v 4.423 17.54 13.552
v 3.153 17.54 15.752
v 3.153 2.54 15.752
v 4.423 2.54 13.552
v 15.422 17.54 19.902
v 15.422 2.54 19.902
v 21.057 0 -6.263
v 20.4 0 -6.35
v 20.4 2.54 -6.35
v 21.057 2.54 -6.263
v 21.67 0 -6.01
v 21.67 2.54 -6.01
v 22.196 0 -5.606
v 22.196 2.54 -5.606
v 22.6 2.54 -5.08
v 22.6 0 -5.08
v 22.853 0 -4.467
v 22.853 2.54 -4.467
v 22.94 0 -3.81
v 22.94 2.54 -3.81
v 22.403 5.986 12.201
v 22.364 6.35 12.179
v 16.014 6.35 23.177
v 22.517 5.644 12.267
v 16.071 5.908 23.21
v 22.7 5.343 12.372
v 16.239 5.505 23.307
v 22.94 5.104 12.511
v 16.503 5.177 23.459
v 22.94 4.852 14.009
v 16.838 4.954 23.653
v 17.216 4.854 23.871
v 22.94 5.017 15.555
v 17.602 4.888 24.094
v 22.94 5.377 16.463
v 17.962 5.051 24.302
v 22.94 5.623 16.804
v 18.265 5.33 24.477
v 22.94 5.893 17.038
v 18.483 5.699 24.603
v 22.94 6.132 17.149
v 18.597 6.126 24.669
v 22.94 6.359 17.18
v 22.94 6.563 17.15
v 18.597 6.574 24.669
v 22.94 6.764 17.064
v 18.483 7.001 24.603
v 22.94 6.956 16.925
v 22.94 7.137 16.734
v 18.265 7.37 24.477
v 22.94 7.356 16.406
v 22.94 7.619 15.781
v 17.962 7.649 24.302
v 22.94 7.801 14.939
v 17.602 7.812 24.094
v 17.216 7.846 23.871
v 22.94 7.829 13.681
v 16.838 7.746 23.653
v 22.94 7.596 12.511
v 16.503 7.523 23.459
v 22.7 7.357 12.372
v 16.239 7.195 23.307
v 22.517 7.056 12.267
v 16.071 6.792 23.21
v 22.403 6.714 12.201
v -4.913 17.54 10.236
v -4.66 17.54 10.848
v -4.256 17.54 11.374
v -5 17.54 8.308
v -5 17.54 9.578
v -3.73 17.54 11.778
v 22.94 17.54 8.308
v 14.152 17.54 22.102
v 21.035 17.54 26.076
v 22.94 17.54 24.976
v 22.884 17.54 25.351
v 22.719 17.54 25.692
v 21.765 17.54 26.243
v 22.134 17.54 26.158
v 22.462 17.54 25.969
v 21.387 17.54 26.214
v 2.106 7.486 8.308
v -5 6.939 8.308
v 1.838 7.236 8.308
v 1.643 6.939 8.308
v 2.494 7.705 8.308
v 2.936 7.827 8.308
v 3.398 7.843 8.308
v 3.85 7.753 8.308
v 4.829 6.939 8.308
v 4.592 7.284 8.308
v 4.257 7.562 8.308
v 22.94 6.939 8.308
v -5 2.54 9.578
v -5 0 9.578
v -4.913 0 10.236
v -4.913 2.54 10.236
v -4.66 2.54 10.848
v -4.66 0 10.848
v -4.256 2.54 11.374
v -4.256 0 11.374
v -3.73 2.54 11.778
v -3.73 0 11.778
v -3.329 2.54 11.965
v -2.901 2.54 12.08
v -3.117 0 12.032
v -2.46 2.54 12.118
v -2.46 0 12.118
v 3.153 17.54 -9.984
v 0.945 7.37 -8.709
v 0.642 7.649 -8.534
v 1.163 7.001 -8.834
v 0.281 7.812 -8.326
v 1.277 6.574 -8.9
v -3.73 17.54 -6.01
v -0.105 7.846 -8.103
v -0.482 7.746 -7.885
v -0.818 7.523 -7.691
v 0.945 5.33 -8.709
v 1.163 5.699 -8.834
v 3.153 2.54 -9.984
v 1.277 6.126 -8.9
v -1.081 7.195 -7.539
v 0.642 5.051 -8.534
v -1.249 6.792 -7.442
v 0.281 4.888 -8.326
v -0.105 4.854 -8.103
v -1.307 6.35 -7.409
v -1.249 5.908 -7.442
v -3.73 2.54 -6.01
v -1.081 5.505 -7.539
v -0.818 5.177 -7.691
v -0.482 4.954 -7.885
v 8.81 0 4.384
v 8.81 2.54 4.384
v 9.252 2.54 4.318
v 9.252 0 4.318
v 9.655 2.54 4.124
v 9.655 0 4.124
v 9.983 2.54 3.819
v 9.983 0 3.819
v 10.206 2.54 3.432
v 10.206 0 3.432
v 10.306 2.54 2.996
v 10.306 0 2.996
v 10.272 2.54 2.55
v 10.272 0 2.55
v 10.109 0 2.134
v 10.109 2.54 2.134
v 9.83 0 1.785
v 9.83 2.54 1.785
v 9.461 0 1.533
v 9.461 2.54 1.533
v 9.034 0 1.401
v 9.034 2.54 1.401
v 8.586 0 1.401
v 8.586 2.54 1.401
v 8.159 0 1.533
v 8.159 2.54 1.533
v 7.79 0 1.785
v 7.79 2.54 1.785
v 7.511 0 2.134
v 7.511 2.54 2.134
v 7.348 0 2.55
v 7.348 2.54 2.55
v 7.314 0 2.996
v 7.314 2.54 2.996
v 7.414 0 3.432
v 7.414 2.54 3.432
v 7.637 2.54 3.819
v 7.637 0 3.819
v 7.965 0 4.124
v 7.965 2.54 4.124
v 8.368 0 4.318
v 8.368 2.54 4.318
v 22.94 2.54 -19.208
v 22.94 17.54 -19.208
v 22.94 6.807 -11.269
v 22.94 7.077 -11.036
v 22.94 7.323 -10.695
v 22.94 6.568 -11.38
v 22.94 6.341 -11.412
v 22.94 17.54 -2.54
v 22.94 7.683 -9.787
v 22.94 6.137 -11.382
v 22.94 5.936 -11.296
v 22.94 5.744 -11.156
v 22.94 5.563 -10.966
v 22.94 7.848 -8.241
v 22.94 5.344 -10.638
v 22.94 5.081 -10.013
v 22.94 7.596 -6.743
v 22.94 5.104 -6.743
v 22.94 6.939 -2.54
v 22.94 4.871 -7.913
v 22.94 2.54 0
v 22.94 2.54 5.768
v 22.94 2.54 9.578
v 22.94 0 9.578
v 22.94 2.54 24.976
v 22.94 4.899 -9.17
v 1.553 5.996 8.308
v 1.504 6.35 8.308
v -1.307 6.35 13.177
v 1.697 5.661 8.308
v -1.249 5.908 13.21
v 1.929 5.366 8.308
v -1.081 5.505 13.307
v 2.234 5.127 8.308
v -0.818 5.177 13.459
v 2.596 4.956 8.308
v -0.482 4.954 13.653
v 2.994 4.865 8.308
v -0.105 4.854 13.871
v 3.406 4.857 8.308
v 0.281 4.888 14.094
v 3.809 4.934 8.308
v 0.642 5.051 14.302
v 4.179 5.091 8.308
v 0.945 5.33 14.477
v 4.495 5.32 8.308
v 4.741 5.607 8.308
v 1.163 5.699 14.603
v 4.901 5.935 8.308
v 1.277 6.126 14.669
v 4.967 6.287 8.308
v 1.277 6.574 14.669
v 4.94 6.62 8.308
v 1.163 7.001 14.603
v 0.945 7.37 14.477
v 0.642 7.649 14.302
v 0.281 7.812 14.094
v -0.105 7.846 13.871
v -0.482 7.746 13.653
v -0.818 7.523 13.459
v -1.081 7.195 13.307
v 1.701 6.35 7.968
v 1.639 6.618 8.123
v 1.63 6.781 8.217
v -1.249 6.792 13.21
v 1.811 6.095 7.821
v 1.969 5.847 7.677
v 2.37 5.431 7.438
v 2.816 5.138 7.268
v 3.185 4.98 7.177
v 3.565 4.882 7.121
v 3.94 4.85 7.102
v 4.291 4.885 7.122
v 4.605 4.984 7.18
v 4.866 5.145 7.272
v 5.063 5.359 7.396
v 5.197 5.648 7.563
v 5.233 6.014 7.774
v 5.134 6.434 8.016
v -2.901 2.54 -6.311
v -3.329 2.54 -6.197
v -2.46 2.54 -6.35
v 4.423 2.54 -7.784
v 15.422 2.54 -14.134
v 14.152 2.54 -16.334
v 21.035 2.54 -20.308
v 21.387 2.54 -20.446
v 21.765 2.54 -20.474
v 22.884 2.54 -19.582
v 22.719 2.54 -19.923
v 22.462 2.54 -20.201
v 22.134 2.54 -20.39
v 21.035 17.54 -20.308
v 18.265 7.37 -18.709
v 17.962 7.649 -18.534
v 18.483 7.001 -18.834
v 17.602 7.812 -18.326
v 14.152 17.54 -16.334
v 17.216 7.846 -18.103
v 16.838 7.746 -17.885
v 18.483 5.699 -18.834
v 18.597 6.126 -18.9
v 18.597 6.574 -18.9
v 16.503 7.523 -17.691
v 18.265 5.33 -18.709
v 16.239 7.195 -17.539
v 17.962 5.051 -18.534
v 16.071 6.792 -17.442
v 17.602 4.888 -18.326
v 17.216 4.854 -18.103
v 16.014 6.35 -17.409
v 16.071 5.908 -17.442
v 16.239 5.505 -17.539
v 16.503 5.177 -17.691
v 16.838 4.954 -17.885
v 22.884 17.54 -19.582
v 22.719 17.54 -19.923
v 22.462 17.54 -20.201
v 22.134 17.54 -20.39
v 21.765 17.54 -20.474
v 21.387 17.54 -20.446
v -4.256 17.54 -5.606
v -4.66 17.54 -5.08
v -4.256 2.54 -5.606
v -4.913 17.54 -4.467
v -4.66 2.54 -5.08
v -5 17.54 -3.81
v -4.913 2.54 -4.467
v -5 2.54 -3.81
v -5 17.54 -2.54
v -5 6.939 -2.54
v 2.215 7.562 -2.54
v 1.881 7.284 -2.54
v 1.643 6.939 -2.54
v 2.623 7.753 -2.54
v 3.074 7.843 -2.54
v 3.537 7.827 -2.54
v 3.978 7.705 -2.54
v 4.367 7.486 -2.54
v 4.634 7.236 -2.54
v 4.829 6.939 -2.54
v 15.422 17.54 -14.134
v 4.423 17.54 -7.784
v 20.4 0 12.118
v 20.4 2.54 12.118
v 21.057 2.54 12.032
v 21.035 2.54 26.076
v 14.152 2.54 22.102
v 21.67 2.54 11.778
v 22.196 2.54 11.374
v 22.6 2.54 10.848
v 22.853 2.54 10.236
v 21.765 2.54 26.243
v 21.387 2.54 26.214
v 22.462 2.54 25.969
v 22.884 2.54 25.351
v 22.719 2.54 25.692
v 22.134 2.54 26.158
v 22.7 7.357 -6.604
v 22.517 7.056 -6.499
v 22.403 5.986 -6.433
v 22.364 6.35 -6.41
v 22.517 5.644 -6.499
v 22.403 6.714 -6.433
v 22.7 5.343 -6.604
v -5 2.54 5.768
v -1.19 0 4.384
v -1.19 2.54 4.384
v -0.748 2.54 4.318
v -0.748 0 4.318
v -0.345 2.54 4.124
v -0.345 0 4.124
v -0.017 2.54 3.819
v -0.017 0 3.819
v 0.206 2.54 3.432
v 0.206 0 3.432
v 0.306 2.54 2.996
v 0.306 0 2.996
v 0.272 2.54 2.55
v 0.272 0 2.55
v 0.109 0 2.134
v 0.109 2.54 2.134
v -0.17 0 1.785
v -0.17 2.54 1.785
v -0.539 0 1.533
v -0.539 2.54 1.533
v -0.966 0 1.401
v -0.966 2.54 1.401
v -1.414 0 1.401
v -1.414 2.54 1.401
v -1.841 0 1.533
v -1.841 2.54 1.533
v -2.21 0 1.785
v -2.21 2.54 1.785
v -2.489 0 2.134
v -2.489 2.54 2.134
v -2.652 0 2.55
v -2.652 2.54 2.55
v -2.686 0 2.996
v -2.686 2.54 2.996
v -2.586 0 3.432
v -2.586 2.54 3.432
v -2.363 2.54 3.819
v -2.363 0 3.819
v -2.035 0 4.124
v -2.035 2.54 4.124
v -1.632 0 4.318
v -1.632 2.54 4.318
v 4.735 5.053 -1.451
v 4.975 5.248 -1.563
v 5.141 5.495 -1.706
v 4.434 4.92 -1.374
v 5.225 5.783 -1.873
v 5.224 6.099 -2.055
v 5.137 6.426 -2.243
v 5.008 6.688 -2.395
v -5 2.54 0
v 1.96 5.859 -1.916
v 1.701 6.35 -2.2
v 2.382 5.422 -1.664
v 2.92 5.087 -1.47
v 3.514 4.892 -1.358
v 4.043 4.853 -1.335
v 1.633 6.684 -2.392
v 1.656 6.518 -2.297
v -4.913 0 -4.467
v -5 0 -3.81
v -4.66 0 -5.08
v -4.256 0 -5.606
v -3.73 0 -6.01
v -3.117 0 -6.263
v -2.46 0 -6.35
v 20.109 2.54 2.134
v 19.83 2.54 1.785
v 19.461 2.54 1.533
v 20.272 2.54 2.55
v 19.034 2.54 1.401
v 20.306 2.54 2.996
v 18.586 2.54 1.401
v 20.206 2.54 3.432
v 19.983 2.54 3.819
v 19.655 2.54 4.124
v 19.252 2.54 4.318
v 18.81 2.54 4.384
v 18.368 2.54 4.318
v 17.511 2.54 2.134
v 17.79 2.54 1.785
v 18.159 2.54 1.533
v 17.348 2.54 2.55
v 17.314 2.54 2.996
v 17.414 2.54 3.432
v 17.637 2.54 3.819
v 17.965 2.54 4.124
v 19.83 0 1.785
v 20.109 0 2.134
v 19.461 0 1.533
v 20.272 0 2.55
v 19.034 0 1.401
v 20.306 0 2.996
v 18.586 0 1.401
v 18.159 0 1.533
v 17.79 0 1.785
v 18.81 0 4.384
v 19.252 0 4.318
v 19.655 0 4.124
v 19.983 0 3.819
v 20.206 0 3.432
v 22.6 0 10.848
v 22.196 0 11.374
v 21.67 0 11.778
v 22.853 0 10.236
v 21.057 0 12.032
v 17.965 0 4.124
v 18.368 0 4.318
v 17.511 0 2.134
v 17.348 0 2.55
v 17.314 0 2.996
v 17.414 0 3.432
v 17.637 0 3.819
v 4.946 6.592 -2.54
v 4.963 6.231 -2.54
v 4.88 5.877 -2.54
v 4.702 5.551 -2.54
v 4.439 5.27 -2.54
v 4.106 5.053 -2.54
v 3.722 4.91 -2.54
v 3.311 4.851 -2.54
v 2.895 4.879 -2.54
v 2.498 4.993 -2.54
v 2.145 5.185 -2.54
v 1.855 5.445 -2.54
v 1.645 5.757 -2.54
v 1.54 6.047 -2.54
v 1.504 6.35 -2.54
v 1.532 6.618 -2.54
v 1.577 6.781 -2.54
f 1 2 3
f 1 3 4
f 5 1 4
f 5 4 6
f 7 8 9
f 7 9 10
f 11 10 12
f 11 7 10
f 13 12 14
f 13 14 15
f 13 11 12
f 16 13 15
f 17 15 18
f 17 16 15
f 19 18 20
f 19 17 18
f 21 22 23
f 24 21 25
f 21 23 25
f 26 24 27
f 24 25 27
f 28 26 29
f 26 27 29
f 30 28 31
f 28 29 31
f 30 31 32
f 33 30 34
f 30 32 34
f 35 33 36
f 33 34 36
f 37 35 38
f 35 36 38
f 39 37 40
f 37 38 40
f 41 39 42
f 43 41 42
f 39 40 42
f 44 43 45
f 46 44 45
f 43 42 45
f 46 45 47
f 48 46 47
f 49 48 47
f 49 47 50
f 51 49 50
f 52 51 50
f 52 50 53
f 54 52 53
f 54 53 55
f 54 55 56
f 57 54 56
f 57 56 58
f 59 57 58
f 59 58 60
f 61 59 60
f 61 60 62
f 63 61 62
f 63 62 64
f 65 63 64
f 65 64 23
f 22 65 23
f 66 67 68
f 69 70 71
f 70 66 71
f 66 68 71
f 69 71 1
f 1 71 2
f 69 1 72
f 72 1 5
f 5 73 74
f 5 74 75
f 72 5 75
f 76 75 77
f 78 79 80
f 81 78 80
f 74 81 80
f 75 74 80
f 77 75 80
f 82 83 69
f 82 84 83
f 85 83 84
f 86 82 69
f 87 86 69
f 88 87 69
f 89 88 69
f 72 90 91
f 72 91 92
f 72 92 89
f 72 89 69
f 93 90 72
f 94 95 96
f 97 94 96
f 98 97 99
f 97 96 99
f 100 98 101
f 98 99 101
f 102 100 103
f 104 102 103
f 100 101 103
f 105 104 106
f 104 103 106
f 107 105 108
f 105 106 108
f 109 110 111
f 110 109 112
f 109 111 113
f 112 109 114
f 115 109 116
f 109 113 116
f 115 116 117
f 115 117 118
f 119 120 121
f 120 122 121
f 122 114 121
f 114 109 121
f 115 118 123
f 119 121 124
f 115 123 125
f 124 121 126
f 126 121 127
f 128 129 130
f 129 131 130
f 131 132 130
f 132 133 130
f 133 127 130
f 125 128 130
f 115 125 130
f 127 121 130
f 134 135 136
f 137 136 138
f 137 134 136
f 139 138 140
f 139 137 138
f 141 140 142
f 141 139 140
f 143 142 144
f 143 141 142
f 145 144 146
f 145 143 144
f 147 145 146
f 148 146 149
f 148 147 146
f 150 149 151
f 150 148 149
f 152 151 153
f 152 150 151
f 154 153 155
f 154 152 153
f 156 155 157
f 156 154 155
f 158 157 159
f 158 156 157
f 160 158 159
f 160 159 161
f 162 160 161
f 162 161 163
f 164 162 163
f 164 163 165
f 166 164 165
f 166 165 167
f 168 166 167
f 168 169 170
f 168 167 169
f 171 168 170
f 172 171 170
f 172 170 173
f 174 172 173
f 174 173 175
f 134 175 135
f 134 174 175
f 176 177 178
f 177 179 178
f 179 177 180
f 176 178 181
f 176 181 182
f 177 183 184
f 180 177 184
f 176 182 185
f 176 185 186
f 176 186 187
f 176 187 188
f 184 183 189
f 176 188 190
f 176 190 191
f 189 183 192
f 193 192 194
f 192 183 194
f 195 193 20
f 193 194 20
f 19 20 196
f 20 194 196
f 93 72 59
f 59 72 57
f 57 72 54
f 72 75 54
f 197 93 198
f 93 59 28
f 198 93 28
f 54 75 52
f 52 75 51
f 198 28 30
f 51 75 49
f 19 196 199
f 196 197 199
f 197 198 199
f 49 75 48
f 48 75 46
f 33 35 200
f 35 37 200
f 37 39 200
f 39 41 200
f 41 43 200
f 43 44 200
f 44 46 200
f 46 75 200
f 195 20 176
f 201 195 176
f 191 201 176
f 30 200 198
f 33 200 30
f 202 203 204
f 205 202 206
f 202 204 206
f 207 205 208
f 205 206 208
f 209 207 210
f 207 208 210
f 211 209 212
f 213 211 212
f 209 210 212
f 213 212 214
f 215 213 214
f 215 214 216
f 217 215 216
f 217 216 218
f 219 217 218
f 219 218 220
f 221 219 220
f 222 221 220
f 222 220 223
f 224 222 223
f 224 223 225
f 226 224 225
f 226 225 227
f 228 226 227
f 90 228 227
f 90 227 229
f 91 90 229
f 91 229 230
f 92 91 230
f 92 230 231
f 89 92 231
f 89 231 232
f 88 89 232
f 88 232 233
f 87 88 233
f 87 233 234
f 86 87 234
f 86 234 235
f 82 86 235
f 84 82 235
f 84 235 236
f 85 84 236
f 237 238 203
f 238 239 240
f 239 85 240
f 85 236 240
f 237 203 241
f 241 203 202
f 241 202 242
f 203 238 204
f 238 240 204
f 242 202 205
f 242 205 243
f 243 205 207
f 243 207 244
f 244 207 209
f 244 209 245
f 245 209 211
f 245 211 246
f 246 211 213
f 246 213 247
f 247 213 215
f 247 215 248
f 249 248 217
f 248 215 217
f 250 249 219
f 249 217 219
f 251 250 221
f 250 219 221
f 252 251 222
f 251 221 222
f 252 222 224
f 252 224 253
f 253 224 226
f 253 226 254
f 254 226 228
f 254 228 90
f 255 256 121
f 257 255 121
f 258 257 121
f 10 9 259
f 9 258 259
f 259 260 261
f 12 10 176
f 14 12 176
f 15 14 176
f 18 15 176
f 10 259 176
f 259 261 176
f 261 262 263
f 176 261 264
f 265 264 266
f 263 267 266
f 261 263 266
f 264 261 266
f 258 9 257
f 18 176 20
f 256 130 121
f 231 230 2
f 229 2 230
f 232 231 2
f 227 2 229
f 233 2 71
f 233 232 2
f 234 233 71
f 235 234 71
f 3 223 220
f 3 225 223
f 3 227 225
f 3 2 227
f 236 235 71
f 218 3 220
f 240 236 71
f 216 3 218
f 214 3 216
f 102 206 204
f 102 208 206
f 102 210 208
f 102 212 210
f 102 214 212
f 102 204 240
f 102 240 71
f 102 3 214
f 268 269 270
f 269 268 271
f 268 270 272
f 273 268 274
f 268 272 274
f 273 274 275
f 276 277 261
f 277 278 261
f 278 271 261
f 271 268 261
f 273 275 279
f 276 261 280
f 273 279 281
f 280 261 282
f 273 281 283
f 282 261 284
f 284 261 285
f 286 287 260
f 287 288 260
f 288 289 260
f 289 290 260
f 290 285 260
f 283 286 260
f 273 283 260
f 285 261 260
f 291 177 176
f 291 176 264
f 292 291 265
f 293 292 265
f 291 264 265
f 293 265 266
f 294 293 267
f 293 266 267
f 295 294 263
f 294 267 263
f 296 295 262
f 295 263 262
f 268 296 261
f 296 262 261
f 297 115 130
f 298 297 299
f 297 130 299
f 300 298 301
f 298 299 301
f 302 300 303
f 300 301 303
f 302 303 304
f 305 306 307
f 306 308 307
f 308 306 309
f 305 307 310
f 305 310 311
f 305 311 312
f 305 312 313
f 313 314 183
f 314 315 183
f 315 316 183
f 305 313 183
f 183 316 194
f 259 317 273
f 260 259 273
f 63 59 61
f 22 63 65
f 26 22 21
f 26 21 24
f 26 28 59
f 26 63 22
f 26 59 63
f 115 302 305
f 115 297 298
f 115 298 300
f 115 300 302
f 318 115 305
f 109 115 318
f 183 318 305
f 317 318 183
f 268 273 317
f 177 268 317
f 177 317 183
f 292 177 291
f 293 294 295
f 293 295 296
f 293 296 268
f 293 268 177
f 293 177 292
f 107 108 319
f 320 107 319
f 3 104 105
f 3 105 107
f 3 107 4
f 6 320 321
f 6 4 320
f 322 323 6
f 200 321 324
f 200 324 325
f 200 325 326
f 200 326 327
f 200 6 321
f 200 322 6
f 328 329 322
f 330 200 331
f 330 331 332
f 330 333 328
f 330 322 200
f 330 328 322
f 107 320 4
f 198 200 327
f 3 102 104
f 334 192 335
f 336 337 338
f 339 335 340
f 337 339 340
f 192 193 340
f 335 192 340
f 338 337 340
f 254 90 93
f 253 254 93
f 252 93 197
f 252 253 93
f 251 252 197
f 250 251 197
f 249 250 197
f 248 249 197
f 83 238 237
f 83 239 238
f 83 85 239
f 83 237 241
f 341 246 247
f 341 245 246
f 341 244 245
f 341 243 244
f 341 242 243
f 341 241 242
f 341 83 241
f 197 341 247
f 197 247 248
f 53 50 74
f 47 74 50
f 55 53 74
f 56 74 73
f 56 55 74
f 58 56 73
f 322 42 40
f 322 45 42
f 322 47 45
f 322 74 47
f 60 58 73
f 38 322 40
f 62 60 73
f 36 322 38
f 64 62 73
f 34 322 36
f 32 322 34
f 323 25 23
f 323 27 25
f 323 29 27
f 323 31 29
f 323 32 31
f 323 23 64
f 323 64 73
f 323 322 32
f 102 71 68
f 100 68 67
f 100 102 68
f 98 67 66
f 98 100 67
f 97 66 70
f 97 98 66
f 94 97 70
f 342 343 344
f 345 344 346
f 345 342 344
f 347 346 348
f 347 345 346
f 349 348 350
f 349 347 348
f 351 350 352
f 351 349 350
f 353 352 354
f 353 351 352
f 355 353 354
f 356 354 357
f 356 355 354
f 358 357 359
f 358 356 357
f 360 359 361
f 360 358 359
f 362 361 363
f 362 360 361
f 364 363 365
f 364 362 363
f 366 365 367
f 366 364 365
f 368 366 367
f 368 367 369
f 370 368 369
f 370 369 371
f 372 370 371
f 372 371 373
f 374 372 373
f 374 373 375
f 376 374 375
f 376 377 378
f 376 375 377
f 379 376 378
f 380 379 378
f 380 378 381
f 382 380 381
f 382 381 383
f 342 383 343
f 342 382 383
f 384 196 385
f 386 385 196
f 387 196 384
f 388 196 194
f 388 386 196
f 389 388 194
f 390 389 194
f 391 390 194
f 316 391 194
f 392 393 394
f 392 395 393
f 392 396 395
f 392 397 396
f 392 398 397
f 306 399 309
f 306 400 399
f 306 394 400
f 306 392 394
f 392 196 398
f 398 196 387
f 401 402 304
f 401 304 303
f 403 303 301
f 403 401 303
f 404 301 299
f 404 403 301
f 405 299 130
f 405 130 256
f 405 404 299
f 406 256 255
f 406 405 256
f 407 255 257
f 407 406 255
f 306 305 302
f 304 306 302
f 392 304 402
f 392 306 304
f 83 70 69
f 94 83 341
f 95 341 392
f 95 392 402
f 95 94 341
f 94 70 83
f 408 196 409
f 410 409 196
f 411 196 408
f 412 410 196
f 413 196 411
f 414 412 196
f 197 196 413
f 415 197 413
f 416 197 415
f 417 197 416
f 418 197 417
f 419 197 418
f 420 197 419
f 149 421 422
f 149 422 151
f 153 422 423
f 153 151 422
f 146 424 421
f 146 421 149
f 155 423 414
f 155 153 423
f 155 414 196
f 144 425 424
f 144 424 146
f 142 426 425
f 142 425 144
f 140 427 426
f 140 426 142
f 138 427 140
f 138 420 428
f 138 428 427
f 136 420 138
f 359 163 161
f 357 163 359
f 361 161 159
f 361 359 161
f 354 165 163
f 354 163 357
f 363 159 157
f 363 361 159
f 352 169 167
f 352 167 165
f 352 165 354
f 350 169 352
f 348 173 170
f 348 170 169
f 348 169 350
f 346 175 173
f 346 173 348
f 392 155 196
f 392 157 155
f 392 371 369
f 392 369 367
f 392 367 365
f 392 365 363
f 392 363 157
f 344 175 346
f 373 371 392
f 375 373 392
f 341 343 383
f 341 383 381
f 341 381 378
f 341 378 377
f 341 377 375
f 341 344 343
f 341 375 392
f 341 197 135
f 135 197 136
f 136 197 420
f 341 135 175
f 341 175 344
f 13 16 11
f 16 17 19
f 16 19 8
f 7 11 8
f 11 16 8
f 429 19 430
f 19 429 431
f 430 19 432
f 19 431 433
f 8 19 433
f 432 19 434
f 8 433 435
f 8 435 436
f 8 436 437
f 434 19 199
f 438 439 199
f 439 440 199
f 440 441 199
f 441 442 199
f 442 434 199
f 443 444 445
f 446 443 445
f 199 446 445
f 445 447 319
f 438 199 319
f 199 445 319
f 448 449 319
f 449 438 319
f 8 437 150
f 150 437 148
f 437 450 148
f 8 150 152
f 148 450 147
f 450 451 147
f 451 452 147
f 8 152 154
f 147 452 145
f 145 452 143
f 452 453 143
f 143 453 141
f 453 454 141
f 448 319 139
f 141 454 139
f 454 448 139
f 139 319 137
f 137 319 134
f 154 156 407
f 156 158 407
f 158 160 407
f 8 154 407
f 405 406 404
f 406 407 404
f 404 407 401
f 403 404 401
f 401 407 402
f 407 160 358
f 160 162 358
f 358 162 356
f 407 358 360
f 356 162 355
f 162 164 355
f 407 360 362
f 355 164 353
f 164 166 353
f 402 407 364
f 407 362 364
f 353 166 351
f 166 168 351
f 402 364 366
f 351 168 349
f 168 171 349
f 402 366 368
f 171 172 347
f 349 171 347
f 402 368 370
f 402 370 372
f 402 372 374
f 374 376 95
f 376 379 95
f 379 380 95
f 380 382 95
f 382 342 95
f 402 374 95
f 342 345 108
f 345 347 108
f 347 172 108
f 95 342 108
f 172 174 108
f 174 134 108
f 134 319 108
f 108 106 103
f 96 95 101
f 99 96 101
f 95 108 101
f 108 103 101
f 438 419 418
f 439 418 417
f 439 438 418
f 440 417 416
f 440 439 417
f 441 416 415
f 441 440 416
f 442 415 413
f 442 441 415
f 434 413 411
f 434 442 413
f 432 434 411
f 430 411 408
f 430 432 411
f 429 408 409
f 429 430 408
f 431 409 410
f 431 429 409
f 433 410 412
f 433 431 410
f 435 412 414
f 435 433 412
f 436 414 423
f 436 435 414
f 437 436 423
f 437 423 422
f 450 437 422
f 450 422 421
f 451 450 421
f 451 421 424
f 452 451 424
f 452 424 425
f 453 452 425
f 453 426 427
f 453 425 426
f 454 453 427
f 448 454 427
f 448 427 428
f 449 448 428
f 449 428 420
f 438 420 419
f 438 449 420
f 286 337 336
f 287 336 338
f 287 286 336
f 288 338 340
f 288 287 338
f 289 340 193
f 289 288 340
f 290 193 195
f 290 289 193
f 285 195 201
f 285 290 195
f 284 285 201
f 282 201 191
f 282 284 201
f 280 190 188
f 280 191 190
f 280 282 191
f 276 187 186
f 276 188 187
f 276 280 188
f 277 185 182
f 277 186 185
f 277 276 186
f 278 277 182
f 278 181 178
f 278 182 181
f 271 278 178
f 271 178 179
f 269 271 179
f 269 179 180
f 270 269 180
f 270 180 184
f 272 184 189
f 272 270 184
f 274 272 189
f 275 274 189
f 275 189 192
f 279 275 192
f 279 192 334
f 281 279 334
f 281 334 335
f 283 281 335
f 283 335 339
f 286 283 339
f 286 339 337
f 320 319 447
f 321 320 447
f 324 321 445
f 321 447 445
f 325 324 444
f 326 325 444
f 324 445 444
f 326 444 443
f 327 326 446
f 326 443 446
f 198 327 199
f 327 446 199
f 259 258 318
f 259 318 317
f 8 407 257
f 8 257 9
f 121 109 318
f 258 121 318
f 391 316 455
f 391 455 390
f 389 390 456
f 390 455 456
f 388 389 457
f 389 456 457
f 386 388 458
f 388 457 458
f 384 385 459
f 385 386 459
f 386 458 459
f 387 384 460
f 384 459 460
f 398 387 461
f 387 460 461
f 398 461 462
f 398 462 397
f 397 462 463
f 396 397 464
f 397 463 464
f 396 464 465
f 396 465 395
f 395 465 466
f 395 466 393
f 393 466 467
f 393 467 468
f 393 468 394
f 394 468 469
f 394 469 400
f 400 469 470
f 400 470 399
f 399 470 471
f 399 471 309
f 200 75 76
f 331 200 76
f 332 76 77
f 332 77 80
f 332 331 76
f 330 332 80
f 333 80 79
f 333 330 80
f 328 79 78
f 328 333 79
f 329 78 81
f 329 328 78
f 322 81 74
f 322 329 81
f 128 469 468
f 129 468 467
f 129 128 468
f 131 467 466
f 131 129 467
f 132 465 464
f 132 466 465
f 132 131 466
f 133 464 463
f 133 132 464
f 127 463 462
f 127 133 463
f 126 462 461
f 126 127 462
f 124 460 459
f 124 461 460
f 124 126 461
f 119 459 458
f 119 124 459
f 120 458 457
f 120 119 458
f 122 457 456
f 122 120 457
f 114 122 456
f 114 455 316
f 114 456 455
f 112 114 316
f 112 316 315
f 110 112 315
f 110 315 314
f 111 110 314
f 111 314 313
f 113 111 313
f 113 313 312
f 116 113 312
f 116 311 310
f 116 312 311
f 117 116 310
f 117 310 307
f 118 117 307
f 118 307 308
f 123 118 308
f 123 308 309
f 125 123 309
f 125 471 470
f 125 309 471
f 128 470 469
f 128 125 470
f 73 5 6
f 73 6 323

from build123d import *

# Parameters (mm, degrees)
SKETCH1_R                  = 1.5
BOSS_EXTRUDE1_DEPTH        = 2.54
BOSS_EXTRUDE3_DEPTH        = 15
SKETCH5_R                  = 1.5
CUT_EXTRUDE1_DEPTH         = 12.7
CHAMFER1_SIZE              = 2.54
CHAMFER1_SIZE_2            = 4.399409051
CUT_EXTRUDE5_DEPTH         = 36.401142437
CHAMFER1_OF_MIRROR1_SIZE   = 4.399409051
CHAMFER1_OF_MIRROR1_SIZE_2 = 2.54


with BuildPart() as part:
    # Sketch1 → Boss-Extrude1 (new body)
    with BuildSketch(Plane(origin=(0, 0, 0), x_dir=(1, 0, 0), z_dir=(0, 1, 0))):
        with BuildLine():
            Line((-2.46, 6.35), (20.4, 6.35))
            ThreePointArc((20.4, 6.35), (22.196051224, 5.606051224), (22.94, 3.81))
            Line((22.94, 3.81), (22.94, -3.81))
            ThreePointArc((22.94, -3.81), (22.196051224, -5.606051224), (20.4, -6.35))
            Line((20.4, -6.35), (-2.46, -6.35))
            ThreePointArc((-2.46, -6.35), (-4.256051224, -5.606051224), (-5, -3.81))
            Line((-5, -3.81), (-5, 3.81))
            ThreePointArc((-5, 3.81), (-4.256051224, 5.606051224), (-2.46, 6.35))
        make_face()
        with Locations(Location((-1.19, -2.88414655, 0), (0, 0, 270))):
            Circle(SKETCH1_R, mode=Mode.SUBTRACT)
        with Locations(Location((8.81, -2.88414655, 0), (0, 0, 270))):
            Circle(SKETCH1_R, mode=Mode.SUBTRACT)
        with Locations(Location((18.81, -2.88414655, 0), (0, 0, 270))):
            Circle(SKETCH1_R, mode=Mode.SUBTRACT)
    boss_extrude1 = extrude(amount=BOSS_EXTRUDE1_DEPTH)

    # Sketch3 → Boss-Extrude3 (add)
    with BuildSketch(Plane(origin=(0, 2.54, 0), x_dir=(1, 0, 0), z_dir=(0, 1, 0))):
        with BuildLine():
            Line((-5, 2.54), (22.94, 2.54))
            Line((22.94, 2.54), (22.94, 3.81))
            Line((22.94, 3.81), (22.94, 19.207931679))
            ThreePointArc((22.94, 19.207931679), (22.305, 20.307783942), (21.035, 20.307783942))
            Line((21.035, 20.307783942), (-3.73, 6.009704526))
            ThreePointArc((-3.73, 6.009704526), (-4.659704526, 5.08), (-5, 3.81))
            Line((-5, 3.81), (-5, 2.54))
        make_face()
    boss_extrude3 = extrude(amount=BOSS_EXTRUDE3_DEPTH)

    # Sketch5 → Cut-Extrude1 (cut)
    with BuildSketch(Plane(origin=(-5.860422493, 0, -4.779704526), x_dir=(0.8660254037844379, 0, -0.5000000000000014), z_dir=(0.5000000000000013, 0, 0.8660254037844378))):
        with Locations(Location((6.758079416, 6.35, 0), (0, 0, 180))):
            Circle(SKETCH5_R)
        with Locations(Location((26.758079416, 6.35, 0), (0, 0, 180))):
            Circle(SKETCH5_R)
    cut_extrude1 = extrude(amount=CUT_EXTRUDE1_DEPTH, mode=Mode.SUBTRACT)

    # Chamfer1
    # the kernel refuses this chamfer: 4.399409051, 2.54 mm, written as the material it adds along each edge
    with BuildSketch(Plane(origin=(-5, 2.54, -2.54), x_dir=(0, -0.057893862402671366, 0.9983227437537925), z_dir=(1, 0, 0))) as chamfer1_piece_1_section:
        Polygon((CHAMFER1_SIZE * 0.998322743754, -CHAMFER1_SIZE * 0.0578938624027), (-CHAMFER1_SIZE_2 * 0.0578938624056, -CHAMFER1_SIZE_2 * 0.998322743805), (0, 0), align=None)
    chamfer1_piece_1 = extrude(amount=27.94, mode=Mode.PRIVATE)
    chamfer1_piece_1 = chamfer1_piece_1 - Plane(origin=(5.060500306, 6.35, 0.619729795), x_dir=(-0.8660254037844379, 0, 0.5000000000000014), z_dir=(-0.5000000000000014, 0, -0.8660254037844379)) * Cylinder(1.5, 74, mode=Mode.PRIVATE)
    add(chamfer1_piece_1)

    # Sketch11 → Cut-Extrude5 (cut, symmetric)
    with BuildSketch(Plane(origin=(0, 17.54, 0), x_dir=(1, 0, 0), z_dir=(0, 1, 0))):
        Polygon((3.153238686, 9.983744234), (4.423238686, 7.784039708), (15.421761314, 14.134039708), (14.151761314, 16.333744234), align=None)
    cut_extrude5 = extrude(amount=CUT_EXTRUDE5_DEPTH, both=True, mode=Mode.SUBTRACT)

    # Mirror1: Boss-Extrude1, Boss-Extrude3, Cut-Extrude1, Cut-Extrude5 across plane
    add(boss_extrude1.mirror(Plane.XY.offset(2.88414655)))
    add(boss_extrude3.mirror(Plane.XY.offset(2.88414655)))
    add(cut_extrude1.mirror(Plane.XY.offset(2.88414655)), mode=Mode.SUBTRACT)
    add(cut_extrude5.mirror(Plane.XY.offset(2.88414655)), mode=Mode.SUBTRACT)

    # Chamfer1 of Mirror1
    # the kernel refuses this chamfer: 4.399409051, 2.54 mm, written as the material it adds along each edge
    with BuildSketch(Plane(origin=(-5, 2.54, 8.308293101), x_dir=(0, 0.9998132206222079, 0.019326765612700737), z_dir=(1, 0, 0))) as chamfer1_of_mirror1_piece_1_section:
        Polygon((CHAMFER1_OF_MIRROR1_SIZE * 0.999813220673, -CHAMFER1_OF_MIRROR1_SIZE * 0.0193267656137), (-CHAMFER1_OF_MIRROR1_SIZE_2 * 0.0193267656127, -CHAMFER1_OF_MIRROR1_SIZE_2 * 0.999813220622), (0, 0), align=None)
    chamfer1_of_mirror1_piece_1 = extrude(amount=27.94, mode=Mode.PRIVATE)
    chamfer1_of_mirror1_piece_1 = chamfer1_of_mirror1_piece_1 - Plane(origin=(5.060500238, 6.35, 5.148563423), x_dir=(-0.8660254037844379, 0, -0.5000000000000014), z_dir=(-0.5000000000000014, 0, 0.8660254037844379)) * Cylinder(1.5, 74, mode=Mode.PRIVATE)
    add(chamfer1_of_mirror1_piece_1)


solid = part.part
